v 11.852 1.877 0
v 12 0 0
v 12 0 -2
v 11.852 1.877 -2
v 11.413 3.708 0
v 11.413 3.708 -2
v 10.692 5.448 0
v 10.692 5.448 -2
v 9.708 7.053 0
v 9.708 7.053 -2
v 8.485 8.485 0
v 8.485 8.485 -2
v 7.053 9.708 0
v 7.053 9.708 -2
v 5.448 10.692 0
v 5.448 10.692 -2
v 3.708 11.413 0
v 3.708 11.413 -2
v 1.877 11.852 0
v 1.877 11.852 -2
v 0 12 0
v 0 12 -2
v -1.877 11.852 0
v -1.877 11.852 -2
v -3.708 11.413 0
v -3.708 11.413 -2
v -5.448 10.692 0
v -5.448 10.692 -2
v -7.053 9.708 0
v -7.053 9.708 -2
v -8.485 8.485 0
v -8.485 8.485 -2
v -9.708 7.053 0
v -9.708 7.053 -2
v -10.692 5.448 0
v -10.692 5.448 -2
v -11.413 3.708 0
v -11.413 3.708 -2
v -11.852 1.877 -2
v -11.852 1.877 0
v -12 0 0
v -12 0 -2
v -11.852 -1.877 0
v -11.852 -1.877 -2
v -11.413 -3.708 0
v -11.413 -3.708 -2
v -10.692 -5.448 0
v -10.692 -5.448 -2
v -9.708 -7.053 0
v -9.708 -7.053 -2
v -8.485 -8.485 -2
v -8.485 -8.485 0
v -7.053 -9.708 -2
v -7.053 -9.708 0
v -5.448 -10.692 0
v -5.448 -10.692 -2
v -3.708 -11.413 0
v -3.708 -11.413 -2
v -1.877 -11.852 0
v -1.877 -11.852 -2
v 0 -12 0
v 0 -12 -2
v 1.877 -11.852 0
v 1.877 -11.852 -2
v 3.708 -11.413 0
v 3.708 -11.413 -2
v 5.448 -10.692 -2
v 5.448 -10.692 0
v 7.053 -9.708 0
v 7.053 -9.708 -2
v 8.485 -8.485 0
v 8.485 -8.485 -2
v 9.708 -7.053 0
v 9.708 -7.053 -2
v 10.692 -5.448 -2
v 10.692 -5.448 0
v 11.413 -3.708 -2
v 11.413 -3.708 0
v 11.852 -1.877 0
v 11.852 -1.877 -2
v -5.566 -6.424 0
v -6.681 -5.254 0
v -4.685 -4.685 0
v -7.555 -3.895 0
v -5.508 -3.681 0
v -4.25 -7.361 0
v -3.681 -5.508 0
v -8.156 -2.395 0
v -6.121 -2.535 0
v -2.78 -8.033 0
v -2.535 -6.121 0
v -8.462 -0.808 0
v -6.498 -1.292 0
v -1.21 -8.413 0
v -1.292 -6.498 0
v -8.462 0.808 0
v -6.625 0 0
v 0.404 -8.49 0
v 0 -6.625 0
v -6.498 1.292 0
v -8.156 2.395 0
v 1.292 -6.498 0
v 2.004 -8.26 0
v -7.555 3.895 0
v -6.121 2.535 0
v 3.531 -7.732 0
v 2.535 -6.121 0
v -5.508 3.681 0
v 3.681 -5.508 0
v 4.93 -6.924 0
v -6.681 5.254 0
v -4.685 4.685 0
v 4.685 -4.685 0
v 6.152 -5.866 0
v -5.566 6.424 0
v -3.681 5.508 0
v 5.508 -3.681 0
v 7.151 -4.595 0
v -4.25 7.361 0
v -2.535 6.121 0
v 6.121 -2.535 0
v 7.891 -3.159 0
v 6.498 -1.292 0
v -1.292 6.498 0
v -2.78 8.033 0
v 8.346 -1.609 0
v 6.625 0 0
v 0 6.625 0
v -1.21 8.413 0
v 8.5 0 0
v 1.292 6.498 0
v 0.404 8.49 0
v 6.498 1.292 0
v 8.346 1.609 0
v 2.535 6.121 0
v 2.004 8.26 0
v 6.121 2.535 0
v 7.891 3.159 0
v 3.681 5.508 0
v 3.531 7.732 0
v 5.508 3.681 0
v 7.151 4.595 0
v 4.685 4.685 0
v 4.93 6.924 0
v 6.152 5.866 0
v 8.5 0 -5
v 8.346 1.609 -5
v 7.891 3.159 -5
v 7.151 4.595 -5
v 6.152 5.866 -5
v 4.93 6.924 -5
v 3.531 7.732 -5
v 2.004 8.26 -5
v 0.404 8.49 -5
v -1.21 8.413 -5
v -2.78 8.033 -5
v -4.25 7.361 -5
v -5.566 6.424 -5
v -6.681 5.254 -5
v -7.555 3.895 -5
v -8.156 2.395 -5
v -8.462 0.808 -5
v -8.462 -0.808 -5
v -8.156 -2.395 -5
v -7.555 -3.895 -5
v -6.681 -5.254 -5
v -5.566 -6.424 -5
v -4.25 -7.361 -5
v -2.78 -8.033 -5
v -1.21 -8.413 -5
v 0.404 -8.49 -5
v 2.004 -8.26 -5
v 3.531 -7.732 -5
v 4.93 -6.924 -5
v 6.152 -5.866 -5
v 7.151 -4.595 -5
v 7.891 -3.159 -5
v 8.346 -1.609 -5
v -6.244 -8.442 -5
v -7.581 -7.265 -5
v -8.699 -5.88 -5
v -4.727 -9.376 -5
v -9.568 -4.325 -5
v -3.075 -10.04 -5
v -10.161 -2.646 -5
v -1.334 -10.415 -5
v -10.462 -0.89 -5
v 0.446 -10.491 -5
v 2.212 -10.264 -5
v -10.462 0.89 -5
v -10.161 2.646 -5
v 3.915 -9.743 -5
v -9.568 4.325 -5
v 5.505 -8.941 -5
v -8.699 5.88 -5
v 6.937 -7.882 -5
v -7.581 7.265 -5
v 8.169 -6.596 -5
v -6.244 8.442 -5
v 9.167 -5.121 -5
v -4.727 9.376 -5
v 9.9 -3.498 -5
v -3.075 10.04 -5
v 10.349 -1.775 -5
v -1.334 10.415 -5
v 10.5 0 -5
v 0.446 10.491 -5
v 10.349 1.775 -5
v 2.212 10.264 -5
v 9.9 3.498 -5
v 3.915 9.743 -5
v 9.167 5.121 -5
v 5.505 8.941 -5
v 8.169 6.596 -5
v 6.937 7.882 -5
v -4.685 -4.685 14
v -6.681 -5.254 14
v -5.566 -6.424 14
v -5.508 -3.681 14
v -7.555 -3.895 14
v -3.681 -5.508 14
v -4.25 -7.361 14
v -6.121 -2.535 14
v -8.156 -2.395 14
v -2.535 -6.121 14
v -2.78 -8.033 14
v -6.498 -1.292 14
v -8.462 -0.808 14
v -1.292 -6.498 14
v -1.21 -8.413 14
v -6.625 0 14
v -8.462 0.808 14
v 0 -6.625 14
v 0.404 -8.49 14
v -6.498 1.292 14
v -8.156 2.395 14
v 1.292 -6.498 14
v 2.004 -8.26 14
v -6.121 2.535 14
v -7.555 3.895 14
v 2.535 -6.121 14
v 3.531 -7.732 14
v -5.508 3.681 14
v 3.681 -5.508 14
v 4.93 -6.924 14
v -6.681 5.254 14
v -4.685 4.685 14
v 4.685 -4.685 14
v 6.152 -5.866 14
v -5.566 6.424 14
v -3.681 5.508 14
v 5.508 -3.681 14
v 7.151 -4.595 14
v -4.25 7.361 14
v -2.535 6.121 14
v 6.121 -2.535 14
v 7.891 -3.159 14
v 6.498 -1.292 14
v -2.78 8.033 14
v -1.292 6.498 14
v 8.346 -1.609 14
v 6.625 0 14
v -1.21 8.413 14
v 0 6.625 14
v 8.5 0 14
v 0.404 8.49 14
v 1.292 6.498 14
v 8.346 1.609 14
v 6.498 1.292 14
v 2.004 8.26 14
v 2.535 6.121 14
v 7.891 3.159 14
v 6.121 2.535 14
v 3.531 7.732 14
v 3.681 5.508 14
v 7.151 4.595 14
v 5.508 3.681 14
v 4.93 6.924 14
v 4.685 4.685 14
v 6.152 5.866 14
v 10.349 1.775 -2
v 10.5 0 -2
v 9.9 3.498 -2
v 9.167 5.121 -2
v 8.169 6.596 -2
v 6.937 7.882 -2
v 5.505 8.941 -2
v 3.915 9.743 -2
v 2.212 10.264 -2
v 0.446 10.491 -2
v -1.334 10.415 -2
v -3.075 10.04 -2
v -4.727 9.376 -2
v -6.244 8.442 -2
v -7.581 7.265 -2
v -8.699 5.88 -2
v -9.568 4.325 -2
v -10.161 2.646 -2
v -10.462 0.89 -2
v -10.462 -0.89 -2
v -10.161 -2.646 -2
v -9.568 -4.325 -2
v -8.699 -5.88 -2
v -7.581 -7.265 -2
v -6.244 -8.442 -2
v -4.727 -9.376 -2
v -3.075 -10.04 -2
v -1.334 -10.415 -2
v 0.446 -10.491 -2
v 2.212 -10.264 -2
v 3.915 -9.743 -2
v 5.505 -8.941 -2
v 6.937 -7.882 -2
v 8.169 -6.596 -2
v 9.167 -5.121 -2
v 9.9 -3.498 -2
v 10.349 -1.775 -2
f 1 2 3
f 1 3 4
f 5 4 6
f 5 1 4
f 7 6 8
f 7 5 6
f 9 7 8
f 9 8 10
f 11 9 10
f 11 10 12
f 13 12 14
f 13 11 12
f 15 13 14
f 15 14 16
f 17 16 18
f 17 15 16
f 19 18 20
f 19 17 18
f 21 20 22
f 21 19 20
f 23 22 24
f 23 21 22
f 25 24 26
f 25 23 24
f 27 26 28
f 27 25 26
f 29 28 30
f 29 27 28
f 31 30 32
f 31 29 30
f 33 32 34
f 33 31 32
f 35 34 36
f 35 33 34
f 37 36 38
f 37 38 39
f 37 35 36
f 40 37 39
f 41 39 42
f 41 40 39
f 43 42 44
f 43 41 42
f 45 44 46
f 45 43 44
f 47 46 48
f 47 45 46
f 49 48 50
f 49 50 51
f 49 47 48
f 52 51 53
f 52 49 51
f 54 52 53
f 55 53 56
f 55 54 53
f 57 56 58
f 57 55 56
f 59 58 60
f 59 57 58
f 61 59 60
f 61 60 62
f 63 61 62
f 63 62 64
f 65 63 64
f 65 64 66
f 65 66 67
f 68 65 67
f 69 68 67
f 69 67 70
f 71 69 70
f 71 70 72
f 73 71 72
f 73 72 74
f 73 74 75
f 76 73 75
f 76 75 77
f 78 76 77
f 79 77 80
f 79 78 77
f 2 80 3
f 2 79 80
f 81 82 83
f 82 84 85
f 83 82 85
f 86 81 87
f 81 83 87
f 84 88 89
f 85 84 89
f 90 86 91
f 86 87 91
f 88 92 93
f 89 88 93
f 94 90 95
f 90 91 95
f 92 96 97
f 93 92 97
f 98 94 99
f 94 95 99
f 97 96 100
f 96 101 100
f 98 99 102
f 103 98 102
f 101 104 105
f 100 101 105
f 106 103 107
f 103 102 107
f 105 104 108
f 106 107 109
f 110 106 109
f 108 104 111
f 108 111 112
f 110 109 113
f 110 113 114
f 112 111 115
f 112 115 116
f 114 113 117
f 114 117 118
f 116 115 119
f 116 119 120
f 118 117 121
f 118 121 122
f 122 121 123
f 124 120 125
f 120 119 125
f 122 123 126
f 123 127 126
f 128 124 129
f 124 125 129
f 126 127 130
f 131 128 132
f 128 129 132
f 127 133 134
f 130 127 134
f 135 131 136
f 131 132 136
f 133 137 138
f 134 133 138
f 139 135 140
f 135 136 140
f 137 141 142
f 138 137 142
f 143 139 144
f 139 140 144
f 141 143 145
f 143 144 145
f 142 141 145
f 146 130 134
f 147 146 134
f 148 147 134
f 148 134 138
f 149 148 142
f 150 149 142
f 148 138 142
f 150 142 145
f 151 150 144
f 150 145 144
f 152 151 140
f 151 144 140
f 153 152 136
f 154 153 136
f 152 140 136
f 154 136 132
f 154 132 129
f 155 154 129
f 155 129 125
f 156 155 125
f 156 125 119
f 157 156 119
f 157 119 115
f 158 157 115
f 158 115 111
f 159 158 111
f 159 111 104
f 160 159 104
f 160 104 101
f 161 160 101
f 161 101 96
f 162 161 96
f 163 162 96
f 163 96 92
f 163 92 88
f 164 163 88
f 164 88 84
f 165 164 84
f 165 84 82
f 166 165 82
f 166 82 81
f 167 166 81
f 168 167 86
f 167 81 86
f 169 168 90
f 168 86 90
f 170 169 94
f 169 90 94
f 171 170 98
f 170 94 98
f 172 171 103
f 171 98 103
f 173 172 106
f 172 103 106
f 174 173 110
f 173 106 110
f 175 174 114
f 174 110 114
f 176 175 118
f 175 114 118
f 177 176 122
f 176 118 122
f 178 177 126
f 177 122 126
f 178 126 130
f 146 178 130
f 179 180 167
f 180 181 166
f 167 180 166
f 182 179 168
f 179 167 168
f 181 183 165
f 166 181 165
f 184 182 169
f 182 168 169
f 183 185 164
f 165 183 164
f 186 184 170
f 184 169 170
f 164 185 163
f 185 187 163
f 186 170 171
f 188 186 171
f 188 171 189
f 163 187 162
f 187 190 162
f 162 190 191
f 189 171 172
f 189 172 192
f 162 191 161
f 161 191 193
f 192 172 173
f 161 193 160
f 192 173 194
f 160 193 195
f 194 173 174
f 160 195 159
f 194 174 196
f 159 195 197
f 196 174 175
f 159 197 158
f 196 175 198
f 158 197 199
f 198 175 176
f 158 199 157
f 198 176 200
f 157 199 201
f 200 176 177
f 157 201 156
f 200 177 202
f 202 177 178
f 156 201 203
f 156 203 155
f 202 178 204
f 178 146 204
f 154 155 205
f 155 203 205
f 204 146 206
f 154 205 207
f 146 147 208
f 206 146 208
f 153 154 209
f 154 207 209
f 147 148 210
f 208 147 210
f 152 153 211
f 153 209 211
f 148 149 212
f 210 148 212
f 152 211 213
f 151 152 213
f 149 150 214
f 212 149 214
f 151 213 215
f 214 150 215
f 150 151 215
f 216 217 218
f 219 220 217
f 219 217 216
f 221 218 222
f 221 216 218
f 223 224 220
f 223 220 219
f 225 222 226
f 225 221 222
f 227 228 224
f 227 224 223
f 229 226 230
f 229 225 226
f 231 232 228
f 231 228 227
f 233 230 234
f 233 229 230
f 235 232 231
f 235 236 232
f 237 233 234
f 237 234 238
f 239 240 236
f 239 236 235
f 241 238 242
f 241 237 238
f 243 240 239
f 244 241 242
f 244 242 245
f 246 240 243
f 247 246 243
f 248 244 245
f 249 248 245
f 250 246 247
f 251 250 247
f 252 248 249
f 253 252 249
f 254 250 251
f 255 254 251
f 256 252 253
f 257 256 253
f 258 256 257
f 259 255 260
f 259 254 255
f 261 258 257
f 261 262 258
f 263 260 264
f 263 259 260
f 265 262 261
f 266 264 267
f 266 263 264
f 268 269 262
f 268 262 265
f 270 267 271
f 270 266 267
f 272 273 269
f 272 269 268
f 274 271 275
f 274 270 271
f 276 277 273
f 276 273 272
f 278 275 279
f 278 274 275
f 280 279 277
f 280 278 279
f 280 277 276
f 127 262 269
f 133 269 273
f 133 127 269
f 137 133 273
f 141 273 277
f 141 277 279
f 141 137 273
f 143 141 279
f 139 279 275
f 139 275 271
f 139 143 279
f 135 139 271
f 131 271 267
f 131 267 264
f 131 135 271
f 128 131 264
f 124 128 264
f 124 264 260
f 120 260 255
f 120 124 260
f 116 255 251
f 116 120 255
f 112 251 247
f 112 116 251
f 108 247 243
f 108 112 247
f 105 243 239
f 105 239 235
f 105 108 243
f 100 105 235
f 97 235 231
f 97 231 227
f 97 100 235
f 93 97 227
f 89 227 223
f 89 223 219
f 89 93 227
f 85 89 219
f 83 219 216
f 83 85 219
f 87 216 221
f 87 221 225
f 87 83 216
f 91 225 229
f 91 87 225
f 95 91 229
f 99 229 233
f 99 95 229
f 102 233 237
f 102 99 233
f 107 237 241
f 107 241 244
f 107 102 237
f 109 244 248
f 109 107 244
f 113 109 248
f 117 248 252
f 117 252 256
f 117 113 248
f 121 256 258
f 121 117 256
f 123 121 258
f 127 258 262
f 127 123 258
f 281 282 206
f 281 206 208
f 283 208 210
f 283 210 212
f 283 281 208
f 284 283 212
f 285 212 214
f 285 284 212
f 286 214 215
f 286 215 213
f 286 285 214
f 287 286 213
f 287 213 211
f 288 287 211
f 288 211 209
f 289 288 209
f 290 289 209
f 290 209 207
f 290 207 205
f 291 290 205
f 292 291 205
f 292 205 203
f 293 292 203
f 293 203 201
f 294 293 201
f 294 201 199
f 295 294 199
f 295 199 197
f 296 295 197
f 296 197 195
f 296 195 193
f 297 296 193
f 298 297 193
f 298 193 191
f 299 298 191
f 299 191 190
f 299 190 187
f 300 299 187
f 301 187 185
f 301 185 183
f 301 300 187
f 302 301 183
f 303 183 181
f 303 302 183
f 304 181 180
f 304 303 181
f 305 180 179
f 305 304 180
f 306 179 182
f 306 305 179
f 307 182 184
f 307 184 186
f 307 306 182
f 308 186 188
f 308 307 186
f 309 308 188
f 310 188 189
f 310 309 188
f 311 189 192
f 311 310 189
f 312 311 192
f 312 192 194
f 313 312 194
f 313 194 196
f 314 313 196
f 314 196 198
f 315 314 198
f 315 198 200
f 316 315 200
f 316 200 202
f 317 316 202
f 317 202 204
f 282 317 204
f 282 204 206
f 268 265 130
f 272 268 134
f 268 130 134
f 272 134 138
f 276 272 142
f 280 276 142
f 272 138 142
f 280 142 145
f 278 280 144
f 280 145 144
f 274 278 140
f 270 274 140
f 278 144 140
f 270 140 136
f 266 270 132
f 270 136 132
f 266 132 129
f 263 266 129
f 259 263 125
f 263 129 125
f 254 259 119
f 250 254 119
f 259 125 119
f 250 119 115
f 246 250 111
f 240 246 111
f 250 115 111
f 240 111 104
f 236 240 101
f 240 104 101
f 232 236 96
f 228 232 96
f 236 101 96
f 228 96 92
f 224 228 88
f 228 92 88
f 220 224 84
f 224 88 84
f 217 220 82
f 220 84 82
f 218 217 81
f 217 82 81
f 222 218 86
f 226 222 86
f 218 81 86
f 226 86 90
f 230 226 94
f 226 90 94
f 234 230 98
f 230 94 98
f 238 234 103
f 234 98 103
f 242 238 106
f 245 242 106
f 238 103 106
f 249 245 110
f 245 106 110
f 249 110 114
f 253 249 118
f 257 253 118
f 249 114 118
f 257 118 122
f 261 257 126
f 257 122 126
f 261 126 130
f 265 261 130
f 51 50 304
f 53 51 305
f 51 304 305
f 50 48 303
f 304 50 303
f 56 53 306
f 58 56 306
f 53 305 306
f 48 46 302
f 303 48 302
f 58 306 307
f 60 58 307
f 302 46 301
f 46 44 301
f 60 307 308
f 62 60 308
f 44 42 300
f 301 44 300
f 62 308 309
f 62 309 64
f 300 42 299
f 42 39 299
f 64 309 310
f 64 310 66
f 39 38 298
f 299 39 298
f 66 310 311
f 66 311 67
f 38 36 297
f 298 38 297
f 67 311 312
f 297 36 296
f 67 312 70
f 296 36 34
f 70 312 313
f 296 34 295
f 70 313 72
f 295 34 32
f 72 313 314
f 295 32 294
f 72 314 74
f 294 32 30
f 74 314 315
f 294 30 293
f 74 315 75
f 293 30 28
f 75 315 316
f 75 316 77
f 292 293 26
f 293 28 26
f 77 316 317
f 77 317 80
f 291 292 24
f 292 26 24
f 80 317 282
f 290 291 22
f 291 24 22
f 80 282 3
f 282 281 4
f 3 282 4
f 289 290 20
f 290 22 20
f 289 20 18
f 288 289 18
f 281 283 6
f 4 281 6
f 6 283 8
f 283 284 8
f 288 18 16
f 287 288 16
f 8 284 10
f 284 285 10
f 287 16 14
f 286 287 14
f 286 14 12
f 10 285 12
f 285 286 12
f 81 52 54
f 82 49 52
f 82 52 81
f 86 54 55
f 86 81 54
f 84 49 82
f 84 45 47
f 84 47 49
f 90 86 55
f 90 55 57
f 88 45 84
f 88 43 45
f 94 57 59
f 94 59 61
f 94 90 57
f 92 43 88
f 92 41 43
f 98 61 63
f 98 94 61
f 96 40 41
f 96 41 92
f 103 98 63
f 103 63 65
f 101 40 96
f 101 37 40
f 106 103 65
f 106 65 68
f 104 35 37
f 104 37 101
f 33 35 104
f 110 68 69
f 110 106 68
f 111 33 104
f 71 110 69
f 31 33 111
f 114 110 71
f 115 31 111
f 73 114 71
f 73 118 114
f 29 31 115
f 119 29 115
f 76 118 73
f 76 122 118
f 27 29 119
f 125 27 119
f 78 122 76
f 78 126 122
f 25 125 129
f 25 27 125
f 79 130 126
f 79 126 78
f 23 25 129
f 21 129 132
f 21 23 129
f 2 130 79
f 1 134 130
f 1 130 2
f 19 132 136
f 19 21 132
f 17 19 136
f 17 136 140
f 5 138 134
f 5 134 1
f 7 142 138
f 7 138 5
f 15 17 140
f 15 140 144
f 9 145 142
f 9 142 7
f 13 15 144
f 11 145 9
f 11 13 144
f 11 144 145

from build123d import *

# Parameters (mm, degrees)
F0_R     = 8.5
F0_R_2   = 6.625
F1_DEPTH = 14
F0_R_3   = 12
F0_R_4   = 10.5
F2_DEPTH = 2
F3_DEPTH = 5


with BuildPart() as f1:
    # F0 (on Top) → F1 (new body)
    with BuildSketch(Plane.XY):
        Circle(F0_R)
        Circle(F0_R_2, mode=Mode.SUBTRACT)
    extrude(amount=F1_DEPTH)



with BuildPart() as f2:
    # F0 (on Top) → F2 (new body)
    with BuildSketch(Plane.XY):
        Circle(F0_R_3)
        Circle(F0_R_4, mode=Mode.SUBTRACT)
        Circle(F0_R_4)
        Circle(F0_R, mode=Mode.SUBTRACT)
    extrude(amount=-F2_DEPTH)


with BuildPart() as f1_1:
    add(f1.part)

    add(f2.part)  # F3 merges F2
    # F0 (on Top) → F3 (join)
    with BuildSketch(Plane.XY):
        Circle(F0_R_4)
        Circle(F0_R, mode=Mode.SUBTRACT)
    extrude(amount=-F3_DEPTH)


solid = f1_1.part
